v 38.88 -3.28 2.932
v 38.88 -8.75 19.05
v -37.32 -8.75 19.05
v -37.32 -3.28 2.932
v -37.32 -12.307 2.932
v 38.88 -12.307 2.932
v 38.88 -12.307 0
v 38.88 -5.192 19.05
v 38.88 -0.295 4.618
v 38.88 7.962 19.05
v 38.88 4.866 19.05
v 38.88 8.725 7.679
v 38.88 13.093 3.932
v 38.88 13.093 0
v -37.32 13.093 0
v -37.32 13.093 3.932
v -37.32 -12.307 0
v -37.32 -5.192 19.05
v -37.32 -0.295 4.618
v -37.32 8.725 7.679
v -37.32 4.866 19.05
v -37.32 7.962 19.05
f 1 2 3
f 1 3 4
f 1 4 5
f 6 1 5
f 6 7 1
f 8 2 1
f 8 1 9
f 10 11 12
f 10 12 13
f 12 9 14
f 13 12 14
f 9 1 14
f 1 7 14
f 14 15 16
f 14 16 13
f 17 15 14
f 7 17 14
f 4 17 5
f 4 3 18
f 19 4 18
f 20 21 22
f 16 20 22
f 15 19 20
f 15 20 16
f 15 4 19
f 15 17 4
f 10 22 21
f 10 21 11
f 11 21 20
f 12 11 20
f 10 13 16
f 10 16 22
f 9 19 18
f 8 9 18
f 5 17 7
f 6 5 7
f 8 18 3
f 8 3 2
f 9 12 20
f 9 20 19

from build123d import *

# Parameters (mm, degrees)
F0_W     = 76.2
F0_H     = 25.4
F1_DEPTH = 19.05
F3_DEPTH = 76.2
F4_DEPTH = 76.2
F6_DEPTH = 76.2


with BuildPart() as f1:
    # F0 (on Top) → F1 (new body)
    with BuildSketch(Plane.XY):
        with Locations((0.7800040767, 0.3926137724)):
            Rectangle(F0_W, F0_H)
    extrude(amount=F1_DEPTH)

    # F2 (on face) → F3 (cut)
    with BuildSketch(Plane(origin=(-37.3199959233, 0, 0), x_dir=(0, -1, 0), z_dir=(-1, 0, 0))):
        Polygon((5.1924203255, 19.05), (-4.8661371025, 19.05), (-8.724951177, 7.6794241368), (0.294794015, 4.6184076928), align=None)
    extrude(amount=-F3_DEPTH, mode=Mode.SUBTRACT)

    # F2 (on face) → F4 (cut)
    with BuildSketch(Plane(origin=(-37.3199959233, 0, 0), x_dir=(0, -1, 0), z_dir=(-1, 0, 0))):
        Polygon((-13.0926137724, 3.9323569939), (-7.9621635377, 19.05), (-13.0926137724, 19.05), align=None)
    extrude(amount=-F4_DEPTH, mode=Mode.SUBTRACT)

    # F5 (on face) → F6 (cut)
    with BuildSketch(Plane(origin=(-37.3199959233, 0, 0), x_dir=(0, -1, 0), z_dir=(-1, 0, 0))):
        Polygon((12.3073862276, 19.05), (8.7499032765, 19.05), (3.2798947146, 2.9317973285), (8.4929587319, 2.9317973285), (12.3073862276, 2.9317973285), align=None)
    extrude(amount=-F6_DEPTH, mode=Mode.SUBTRACT)


solid = f1.part
